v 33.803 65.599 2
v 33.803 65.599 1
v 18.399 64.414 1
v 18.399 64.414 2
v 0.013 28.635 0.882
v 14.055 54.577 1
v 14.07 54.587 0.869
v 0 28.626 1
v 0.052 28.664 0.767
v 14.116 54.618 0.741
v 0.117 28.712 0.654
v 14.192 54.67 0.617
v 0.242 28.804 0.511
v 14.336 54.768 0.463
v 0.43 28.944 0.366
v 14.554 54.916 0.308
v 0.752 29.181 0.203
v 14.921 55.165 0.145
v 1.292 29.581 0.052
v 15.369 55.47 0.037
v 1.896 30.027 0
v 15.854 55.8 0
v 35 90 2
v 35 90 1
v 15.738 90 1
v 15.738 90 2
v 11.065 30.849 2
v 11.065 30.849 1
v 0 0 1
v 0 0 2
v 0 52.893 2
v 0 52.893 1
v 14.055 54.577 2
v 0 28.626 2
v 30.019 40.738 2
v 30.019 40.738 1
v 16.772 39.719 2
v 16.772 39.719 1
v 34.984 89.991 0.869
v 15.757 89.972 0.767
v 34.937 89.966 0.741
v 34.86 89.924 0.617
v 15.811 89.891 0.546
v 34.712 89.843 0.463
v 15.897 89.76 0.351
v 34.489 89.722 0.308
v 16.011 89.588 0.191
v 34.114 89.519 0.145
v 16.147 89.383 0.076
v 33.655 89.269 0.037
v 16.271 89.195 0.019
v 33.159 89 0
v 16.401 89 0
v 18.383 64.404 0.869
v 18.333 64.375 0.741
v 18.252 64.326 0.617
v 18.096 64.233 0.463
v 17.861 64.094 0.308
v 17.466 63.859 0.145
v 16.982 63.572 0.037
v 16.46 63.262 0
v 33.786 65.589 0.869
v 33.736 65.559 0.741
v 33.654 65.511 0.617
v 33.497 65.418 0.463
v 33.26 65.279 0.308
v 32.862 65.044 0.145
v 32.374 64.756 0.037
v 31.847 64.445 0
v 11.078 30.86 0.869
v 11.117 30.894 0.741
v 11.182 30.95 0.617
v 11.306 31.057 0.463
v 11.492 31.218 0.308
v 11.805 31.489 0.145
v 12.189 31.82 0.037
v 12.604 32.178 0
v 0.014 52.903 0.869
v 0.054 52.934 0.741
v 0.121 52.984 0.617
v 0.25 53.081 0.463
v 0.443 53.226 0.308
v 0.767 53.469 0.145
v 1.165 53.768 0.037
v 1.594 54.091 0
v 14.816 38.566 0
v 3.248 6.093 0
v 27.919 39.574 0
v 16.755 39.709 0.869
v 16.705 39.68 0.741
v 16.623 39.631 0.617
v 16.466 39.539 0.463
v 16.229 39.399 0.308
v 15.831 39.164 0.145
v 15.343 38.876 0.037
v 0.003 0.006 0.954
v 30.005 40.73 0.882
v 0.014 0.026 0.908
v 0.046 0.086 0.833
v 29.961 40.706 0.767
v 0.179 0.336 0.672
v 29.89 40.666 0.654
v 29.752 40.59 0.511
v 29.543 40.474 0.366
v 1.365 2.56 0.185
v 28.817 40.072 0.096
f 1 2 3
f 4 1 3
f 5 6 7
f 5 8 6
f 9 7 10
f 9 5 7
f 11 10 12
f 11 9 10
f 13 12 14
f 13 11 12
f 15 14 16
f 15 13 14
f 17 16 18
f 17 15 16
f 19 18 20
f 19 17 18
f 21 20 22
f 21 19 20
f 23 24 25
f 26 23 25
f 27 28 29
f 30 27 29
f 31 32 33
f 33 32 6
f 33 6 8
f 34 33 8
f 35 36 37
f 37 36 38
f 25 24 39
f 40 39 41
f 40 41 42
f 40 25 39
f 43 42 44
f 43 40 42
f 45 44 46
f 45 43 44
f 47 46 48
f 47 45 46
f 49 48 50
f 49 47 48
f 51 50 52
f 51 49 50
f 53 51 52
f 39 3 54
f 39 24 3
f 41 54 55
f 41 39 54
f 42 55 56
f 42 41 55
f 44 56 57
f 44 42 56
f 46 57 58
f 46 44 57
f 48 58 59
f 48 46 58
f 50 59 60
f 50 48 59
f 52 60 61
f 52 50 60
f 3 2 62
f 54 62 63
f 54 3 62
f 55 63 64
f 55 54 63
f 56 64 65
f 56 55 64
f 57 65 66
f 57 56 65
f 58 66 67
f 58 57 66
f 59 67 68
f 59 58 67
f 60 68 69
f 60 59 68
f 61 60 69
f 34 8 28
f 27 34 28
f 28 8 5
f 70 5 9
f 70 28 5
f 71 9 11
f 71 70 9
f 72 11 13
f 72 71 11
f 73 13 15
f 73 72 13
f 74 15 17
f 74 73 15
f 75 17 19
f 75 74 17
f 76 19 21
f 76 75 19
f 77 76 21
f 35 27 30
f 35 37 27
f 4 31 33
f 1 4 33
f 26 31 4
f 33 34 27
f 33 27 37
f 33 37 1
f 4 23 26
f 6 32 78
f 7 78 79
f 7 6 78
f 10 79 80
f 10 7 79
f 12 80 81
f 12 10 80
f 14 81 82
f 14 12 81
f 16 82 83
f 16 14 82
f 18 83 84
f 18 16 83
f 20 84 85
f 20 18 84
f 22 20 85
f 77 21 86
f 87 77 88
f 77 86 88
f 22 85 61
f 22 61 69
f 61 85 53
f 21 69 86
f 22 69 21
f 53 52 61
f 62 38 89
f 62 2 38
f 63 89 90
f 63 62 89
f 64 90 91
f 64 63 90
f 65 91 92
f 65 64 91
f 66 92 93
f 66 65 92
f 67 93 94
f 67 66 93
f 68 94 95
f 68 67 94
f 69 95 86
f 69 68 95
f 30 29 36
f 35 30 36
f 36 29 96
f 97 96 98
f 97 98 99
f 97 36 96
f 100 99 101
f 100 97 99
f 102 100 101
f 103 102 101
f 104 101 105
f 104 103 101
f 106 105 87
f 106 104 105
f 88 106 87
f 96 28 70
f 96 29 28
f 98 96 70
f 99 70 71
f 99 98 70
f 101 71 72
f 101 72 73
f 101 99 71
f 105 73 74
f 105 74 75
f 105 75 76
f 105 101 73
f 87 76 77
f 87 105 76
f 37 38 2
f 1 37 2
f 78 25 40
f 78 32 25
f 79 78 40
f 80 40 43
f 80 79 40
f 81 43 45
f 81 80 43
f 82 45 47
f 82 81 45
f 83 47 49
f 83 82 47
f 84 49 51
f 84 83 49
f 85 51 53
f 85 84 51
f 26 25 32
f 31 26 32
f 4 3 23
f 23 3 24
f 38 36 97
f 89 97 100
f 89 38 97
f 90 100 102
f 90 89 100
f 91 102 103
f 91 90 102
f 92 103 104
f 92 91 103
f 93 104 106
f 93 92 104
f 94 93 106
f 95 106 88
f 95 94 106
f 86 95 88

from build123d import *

# Parameters (mm, degrees)
DODANIE_WYCI_GNI_CIE1_DEPTH = 2
ZAOKR_GLENIE1_R             = 1


with BuildPart() as part:
    # Szkic1 → Dodanie-wyciągnięcie1 (new body)
    with BuildSketch(Plane.XY):
        Polygon((35, 90), (15.738496678, 90), (0, 52.892860976), (14.054590176, 54.576767478), (0, 28.625581399), (11.064716979, 30.848994041), (0, 0), (30.019363734, 40.738188486), (16.772070835, 39.719165955), (33.803123901, 65.598770402), (18.399416714, 64.413869849), align=None)
    extrude(amount=DODANIE_WYCI_GNI_CIE1_DEPTH)

    # Zaokrąglenie1
    zaokr_glenie1_edges = [part.edges().sort_by_distance(p)[0] for p in [
        (5.532358489, 15.424497021, 0),
        (5.532358489, 29.73728772, 0),
        (7.027295088, 41.601174439, 0),
        (7.027295088, 53.734814227, 0),
        (7.869248339, 71.446430488, 0),
        (25.369248339, 90, 0),
        (26.699708357, 77.206934925, 0),
        (26.101270307, 65.006320126, 0),
        (25.287597368, 52.658968179, 0),
        (23.395717284, 40.228677221, 0),
        (15.009681867, 20.369094243, 0),
    ]]
    fillet(zaokr_glenie1_edges, radius=ZAOKR_GLENIE1_R)


solid = part.part
